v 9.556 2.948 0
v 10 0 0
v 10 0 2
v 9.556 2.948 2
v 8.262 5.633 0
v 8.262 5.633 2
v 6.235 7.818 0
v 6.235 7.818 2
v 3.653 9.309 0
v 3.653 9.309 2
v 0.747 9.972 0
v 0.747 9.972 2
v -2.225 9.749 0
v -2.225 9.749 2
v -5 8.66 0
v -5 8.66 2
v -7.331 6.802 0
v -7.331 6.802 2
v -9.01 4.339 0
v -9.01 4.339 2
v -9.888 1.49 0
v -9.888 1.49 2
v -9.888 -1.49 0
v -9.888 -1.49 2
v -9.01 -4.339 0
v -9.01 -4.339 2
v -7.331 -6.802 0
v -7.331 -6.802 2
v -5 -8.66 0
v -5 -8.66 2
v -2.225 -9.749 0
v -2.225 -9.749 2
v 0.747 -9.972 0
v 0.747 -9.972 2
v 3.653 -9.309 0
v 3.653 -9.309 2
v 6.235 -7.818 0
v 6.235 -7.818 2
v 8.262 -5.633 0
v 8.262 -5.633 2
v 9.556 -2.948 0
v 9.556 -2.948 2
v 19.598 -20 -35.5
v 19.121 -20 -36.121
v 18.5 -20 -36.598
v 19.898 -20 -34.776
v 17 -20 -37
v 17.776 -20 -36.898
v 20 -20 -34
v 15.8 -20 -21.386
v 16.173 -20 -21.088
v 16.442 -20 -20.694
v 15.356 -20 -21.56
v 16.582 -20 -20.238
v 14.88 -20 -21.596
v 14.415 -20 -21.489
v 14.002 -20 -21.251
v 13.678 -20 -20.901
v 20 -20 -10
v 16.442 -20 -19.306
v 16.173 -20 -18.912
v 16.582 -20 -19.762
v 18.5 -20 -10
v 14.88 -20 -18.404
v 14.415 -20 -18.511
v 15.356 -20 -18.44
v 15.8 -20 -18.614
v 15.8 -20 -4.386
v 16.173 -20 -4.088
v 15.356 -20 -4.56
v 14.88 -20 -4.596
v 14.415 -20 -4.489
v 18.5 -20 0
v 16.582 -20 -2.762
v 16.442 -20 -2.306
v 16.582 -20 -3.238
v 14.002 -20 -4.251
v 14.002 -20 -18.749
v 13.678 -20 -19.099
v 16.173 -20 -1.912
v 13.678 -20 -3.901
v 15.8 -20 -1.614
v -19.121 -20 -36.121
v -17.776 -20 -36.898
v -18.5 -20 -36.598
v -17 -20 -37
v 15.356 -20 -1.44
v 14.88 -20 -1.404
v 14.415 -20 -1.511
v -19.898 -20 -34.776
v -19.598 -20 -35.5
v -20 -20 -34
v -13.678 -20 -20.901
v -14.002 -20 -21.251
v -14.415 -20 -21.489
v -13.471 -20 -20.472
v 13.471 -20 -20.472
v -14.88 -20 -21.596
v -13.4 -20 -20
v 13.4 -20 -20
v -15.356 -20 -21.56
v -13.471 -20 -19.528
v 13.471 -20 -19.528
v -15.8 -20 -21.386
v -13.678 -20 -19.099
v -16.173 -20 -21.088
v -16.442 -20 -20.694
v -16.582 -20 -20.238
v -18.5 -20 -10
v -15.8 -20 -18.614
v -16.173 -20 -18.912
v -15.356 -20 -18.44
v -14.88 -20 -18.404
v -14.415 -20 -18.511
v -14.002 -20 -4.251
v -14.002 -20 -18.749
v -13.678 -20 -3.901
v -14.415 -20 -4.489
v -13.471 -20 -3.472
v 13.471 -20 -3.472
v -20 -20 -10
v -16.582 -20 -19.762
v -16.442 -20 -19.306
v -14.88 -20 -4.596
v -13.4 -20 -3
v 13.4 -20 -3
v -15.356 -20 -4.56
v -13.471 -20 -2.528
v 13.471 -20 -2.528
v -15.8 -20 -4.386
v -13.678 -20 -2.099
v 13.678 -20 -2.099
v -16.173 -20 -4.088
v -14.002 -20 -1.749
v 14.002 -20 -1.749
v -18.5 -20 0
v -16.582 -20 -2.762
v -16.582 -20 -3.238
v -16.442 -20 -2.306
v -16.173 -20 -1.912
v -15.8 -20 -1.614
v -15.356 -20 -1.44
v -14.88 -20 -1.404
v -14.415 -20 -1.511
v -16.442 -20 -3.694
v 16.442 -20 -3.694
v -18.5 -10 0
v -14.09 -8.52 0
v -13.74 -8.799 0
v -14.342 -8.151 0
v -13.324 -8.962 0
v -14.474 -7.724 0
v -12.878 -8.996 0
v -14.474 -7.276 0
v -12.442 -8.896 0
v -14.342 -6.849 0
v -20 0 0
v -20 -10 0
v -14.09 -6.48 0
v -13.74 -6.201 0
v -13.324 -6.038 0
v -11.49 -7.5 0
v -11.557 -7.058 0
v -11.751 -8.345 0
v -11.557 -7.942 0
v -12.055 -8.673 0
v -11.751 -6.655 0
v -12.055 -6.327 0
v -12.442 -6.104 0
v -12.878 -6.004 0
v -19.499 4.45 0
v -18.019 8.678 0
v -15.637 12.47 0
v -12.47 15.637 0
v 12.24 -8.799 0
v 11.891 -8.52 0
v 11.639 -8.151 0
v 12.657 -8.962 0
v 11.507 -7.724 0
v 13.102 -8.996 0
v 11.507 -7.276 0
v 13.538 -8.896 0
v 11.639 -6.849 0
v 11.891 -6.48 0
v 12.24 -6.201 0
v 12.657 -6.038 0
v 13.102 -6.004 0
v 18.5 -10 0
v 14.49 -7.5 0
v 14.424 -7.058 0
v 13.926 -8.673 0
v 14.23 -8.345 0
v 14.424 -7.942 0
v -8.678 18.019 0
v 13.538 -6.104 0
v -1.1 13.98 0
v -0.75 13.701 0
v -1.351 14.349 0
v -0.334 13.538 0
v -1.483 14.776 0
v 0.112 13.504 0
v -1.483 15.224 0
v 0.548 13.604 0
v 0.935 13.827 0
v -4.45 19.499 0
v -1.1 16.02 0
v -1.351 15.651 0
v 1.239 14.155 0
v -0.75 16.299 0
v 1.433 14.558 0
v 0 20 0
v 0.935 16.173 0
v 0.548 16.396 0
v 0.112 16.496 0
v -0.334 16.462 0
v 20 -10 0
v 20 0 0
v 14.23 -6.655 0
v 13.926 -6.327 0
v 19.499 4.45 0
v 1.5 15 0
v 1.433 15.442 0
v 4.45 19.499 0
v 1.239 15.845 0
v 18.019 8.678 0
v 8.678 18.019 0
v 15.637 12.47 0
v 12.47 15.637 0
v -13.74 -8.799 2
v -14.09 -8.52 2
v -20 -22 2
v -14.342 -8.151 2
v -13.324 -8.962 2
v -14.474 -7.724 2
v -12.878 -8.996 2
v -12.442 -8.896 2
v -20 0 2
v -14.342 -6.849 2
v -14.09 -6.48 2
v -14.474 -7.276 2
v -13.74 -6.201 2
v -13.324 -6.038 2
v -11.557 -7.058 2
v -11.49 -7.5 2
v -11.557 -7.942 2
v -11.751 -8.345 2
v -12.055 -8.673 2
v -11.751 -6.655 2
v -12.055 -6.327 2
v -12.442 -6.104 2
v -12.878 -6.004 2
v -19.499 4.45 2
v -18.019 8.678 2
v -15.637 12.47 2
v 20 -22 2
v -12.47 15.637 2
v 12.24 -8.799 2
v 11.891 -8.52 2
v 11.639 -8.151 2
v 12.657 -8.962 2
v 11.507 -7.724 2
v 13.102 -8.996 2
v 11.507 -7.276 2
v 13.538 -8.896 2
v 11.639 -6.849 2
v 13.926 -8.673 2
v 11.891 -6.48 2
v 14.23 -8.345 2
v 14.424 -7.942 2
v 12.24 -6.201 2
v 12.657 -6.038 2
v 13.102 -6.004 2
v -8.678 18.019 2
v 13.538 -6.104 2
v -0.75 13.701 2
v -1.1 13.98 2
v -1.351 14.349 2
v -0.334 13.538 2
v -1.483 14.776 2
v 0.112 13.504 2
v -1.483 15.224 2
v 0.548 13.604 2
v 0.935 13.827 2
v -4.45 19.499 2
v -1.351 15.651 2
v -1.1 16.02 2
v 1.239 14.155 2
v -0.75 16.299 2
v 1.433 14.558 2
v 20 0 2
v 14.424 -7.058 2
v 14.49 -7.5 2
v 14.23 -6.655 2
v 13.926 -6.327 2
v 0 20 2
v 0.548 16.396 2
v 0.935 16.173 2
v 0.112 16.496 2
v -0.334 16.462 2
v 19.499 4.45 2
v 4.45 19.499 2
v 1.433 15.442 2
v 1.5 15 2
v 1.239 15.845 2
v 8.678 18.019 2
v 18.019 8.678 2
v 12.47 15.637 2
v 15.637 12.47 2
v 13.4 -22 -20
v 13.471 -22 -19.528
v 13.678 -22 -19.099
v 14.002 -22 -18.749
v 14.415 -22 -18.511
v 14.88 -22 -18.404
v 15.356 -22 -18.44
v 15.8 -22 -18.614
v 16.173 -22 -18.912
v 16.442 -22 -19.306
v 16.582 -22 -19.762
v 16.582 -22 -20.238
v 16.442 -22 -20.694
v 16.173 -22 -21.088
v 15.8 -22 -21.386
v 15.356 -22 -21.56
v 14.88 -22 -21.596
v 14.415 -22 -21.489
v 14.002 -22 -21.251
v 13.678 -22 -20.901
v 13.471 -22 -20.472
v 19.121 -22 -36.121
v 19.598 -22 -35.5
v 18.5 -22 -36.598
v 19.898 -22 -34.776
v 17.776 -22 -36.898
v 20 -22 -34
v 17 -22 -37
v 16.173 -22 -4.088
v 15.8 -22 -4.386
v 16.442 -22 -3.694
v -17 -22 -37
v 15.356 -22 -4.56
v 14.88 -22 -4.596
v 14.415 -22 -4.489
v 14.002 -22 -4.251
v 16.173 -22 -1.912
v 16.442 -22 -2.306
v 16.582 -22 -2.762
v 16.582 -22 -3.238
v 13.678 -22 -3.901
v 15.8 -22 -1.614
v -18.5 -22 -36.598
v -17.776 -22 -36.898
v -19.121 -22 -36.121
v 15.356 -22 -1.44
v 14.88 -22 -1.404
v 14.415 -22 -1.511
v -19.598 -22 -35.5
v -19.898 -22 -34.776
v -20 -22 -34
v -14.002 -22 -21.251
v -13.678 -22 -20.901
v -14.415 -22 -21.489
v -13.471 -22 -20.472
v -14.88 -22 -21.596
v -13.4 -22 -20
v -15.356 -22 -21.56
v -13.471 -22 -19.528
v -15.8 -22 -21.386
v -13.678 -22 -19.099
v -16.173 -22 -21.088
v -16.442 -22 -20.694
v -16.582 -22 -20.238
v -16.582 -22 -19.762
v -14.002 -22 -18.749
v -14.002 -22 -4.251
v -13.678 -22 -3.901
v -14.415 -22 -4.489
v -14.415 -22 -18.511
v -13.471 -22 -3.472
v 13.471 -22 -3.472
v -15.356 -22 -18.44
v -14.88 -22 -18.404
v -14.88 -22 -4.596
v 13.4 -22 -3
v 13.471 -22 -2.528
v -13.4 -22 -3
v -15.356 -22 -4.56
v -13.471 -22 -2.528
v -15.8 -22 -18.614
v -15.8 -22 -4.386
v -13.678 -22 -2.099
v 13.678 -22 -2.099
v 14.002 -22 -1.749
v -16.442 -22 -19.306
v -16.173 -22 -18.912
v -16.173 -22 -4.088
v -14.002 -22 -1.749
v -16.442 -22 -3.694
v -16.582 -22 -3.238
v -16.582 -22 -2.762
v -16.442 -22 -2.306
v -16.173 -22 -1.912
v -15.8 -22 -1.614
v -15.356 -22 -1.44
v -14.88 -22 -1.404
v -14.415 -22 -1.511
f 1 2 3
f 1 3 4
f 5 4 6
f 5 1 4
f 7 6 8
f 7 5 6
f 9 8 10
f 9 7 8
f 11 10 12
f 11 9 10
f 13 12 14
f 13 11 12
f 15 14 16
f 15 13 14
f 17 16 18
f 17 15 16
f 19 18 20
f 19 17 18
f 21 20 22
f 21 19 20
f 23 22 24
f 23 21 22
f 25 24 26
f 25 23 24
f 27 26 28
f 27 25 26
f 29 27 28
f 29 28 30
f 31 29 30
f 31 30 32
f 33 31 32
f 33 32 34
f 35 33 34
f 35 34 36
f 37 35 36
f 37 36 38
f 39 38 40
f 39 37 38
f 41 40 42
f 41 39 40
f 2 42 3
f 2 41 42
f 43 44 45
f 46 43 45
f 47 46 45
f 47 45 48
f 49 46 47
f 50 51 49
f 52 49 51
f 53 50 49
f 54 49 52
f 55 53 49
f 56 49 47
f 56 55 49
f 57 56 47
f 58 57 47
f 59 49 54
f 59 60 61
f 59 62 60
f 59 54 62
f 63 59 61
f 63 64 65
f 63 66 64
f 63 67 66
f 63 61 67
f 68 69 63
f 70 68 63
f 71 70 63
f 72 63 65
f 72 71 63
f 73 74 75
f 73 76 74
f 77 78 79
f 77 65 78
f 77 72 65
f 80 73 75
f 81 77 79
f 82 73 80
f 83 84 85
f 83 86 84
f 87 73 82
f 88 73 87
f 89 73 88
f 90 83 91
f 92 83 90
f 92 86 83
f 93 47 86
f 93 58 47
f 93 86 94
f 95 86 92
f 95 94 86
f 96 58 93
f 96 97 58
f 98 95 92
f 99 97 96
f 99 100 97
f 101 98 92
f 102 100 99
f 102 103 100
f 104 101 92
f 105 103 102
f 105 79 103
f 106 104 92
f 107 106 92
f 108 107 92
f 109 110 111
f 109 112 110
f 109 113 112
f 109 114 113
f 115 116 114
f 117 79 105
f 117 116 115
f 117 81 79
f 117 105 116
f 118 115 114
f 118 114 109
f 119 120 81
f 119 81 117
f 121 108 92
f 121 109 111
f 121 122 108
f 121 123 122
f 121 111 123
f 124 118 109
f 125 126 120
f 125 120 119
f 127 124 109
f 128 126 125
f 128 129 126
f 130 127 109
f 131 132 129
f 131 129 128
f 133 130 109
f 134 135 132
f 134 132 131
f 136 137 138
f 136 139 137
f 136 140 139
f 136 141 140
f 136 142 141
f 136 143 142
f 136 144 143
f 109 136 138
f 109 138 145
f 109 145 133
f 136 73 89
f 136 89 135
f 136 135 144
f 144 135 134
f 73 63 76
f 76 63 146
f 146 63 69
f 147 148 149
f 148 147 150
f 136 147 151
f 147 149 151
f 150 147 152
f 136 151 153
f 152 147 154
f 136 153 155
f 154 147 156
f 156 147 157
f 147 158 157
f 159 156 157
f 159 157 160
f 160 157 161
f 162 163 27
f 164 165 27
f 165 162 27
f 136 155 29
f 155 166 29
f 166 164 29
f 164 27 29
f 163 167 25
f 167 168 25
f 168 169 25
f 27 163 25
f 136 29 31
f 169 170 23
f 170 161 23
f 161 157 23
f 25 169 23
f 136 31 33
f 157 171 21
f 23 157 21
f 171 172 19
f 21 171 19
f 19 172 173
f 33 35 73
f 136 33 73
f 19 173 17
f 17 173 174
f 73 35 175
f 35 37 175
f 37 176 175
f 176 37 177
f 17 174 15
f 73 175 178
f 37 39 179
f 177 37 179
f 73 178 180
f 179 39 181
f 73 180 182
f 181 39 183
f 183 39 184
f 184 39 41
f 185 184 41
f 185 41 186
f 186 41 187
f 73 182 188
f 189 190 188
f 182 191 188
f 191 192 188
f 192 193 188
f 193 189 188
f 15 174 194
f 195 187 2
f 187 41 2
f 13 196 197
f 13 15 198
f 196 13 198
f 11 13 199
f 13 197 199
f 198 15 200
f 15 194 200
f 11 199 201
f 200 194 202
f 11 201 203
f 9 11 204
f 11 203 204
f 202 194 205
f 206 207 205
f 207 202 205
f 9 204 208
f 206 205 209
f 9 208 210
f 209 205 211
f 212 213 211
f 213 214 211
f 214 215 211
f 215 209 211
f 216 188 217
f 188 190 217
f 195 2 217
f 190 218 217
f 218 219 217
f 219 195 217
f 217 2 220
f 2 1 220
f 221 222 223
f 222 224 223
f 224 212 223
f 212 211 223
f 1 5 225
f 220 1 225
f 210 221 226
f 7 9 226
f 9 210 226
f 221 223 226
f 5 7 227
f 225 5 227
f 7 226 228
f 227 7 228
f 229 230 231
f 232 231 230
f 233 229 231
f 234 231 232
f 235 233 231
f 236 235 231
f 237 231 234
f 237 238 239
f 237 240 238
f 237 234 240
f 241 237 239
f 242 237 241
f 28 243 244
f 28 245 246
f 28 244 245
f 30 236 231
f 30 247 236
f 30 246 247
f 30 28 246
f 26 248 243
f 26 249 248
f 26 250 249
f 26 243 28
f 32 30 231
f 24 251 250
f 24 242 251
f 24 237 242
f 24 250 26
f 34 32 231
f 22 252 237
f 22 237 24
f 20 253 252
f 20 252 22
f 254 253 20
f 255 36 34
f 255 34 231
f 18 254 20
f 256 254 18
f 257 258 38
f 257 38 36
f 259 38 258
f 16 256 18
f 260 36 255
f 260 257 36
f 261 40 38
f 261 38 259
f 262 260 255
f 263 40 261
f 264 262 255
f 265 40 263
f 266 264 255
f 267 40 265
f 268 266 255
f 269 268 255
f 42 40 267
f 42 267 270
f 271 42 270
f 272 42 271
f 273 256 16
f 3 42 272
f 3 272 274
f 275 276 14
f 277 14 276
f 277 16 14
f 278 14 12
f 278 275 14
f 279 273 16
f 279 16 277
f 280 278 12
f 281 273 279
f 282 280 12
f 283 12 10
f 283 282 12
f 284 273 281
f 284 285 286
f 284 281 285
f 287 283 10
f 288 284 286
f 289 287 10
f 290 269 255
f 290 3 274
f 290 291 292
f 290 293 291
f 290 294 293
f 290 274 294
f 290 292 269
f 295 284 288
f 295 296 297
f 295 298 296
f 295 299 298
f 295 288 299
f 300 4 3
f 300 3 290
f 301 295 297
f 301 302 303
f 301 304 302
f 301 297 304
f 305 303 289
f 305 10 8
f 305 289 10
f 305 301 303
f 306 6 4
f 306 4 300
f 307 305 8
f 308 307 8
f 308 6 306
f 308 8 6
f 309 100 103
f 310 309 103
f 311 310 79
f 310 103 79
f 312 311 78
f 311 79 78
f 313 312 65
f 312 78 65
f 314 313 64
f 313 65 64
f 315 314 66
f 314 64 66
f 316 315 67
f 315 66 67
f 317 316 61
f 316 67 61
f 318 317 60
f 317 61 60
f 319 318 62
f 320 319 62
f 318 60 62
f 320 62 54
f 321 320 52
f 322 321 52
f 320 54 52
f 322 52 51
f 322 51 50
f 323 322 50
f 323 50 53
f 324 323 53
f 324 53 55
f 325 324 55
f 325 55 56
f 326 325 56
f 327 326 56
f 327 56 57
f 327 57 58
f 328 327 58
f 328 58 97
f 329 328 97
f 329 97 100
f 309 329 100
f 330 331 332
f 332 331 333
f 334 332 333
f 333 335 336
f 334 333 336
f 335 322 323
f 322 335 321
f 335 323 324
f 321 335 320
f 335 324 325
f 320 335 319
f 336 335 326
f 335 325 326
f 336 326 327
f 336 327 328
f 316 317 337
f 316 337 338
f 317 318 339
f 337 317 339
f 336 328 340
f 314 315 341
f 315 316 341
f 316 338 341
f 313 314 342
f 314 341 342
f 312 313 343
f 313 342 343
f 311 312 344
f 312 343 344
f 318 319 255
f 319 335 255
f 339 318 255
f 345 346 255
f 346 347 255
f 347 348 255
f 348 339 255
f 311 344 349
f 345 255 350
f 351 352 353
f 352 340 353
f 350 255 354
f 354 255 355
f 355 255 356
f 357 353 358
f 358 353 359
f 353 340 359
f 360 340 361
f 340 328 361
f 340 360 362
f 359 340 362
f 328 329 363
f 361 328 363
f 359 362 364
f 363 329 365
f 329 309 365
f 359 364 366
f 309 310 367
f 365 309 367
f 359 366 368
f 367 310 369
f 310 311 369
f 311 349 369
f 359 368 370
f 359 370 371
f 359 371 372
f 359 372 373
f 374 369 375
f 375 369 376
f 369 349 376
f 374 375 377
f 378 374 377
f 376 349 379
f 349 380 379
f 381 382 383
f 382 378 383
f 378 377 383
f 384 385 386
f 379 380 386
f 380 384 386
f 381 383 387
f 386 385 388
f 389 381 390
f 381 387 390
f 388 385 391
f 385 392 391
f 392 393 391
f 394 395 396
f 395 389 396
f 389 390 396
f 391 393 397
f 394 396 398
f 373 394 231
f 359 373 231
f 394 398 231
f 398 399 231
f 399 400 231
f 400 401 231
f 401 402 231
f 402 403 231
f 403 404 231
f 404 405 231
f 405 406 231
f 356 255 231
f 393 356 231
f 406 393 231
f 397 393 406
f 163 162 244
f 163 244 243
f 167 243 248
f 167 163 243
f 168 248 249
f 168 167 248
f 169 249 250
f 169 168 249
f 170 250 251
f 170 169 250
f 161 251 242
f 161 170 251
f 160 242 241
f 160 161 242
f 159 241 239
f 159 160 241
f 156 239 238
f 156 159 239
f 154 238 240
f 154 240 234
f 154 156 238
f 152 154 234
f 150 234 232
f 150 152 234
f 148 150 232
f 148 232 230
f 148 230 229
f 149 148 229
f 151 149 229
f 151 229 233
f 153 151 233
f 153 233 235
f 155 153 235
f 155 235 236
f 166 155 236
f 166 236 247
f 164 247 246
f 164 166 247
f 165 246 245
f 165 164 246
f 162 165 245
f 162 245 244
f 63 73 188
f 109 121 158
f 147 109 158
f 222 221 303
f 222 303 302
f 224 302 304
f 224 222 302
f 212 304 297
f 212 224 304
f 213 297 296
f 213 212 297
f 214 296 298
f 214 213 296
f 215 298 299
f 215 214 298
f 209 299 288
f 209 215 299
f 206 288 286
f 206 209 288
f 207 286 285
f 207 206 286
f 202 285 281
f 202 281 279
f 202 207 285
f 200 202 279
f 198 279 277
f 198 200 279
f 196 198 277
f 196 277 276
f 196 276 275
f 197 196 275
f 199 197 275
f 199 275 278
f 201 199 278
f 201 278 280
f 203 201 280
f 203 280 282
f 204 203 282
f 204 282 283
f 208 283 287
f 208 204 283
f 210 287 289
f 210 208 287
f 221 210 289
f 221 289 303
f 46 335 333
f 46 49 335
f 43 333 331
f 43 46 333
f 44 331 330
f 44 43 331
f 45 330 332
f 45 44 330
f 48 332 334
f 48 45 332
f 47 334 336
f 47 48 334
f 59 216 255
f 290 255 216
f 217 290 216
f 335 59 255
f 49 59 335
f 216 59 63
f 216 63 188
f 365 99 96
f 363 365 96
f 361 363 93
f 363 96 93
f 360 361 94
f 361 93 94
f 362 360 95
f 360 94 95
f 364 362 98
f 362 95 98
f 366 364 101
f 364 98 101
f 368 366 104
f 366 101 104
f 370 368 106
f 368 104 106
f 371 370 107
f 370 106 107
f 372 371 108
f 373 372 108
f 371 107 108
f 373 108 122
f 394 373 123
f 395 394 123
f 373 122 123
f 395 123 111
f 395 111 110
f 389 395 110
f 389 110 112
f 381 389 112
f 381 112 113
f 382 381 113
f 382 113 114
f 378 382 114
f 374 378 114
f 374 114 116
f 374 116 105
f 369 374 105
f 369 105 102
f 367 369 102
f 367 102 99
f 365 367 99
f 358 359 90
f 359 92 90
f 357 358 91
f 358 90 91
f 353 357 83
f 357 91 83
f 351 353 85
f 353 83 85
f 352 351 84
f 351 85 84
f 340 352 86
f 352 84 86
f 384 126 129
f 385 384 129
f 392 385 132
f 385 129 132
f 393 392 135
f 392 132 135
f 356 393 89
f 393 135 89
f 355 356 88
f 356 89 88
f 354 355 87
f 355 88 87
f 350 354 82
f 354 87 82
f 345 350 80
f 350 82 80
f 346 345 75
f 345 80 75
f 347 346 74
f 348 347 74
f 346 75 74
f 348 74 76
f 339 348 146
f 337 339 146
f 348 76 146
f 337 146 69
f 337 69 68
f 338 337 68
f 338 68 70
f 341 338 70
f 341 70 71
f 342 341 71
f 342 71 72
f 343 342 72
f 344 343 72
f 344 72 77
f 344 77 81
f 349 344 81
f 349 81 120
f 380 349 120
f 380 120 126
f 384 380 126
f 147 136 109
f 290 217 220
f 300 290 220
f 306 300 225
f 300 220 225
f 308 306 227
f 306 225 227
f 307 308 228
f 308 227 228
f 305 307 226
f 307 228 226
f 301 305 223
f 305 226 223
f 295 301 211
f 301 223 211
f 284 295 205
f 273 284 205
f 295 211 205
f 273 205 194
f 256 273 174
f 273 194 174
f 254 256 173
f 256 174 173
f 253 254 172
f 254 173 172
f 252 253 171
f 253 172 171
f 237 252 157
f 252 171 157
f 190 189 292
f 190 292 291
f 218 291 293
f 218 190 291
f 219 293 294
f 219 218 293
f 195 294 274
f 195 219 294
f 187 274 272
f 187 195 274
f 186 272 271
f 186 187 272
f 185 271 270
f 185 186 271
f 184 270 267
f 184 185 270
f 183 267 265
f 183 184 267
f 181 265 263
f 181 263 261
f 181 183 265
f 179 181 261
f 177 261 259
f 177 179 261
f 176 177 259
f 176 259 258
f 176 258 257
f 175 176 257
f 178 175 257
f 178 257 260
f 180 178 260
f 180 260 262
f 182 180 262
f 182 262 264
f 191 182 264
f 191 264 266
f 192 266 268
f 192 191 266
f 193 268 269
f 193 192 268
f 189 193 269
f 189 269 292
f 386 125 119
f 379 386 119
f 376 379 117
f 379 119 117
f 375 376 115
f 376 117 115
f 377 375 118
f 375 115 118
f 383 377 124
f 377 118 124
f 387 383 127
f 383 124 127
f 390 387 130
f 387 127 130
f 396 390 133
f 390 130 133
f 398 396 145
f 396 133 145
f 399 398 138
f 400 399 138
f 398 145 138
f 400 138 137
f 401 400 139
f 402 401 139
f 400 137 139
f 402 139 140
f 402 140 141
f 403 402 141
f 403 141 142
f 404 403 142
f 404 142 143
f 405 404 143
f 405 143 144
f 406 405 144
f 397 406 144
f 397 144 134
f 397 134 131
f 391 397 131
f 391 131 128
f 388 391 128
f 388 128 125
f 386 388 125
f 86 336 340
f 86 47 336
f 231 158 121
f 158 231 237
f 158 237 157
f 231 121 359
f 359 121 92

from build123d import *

# Parameters (mm, degrees)
SKETCH1_R           = 1.5
SKETCH1_R_2         = 10
BOSS_EXTRUDE1_DEPTH = 2
SKETCH2_W           = 40
SKETCH2_H           = 2
BOSS_EXTRUDE2_DEPTH = 37
FILLET1_R           = 3
SKETCH3_R           = 1.6
CUT_EXTRUDE1_DEPTH  = 59.043087444
RIB2_DEPTH          = 1.5


# Read off the part's stored shape, not the designer's step: Rib2
with BuildPart() as part:
    # Sketch1 → Boss-Extrude1 (new body)
    with BuildSketch(Plane.XY):
        with BuildLine():
            Line((-20, 0), (-20, -22))
            Line((-20, -22), (20, -22))
            Line((20, -22), (20, 0))
            ThreePointArc((20, 0), (0, 20), (-20, 0))
        make_face()
        with Locations((0, 15)):
            Circle(SKETCH1_R, mode=Mode.SUBTRACT)
        with Locations((12.990381057, -7.5)):
            Circle(SKETCH1_R, mode=Mode.SUBTRACT)
        with Locations((-12.990381057, -7.5)):
            Circle(SKETCH1_R, mode=Mode.SUBTRACT)
        Circle(SKETCH1_R_2, mode=Mode.SUBTRACT)
    extrude(amount=BOSS_EXTRUDE1_DEPTH)

    # Sketch2 → Boss-Extrude2 (add)
    with BuildSketch(Plane(origin=(0, 0, 0), x_dir=(-1, 0, 0), z_dir=(0, 0, -1))):
        with Locations((0, -21)):
            Rectangle(SKETCH2_W, SKETCH2_H)
    extrude(amount=BOSS_EXTRUDE2_DEPTH)

    # Fillet1
    fillet1_edges = [part.edges().sort_by_distance(p)[0] for p in [
        (-20, -21, -37),
        (20, -21, -37),
    ]]
    fillet(fillet1_edges, radius=FILLET1_R)

    # Sketch3 → Cut-Extrude1 (cut, through all)
    with BuildSketch(Plane(origin=(0, -20, 0), x_dir=(1, 0, 0), z_dir=(0, 1, 0))):
        with Locations(Location((15, 20, 0), (0, 0, 180))):
            Circle(SKETCH3_R)
        with Locations(Location((15, 3, 0), (0, 0, 180))):
            Circle(SKETCH3_R)
        with Locations((-15, 3)):
            Circle(SKETCH3_R)
        with Locations((-15, 20)):
            Circle(SKETCH3_R)
    extrude(amount=-CUT_EXTRUDE1_DEPTH, mode=Mode.SUBTRACT)

    # Rib2 outline → Rib2 (add)
    with BuildSketch(Plane(origin=(-20, 0, 0), x_dir=(0, 0, -1), z_dir=(1, 0, 0))):
        Polygon((10, -20), (0, -10), (0, -20), align=None)
    rib2 = extrude(amount=RIB2_DEPTH)

    # Mirror1: Rib2 across plane
    add(rib2.mirror(Plane(origin=(0, 0, 0), x_dir=(0, 0, 1), z_dir=(1, 0, 0))))


solid = part.part
